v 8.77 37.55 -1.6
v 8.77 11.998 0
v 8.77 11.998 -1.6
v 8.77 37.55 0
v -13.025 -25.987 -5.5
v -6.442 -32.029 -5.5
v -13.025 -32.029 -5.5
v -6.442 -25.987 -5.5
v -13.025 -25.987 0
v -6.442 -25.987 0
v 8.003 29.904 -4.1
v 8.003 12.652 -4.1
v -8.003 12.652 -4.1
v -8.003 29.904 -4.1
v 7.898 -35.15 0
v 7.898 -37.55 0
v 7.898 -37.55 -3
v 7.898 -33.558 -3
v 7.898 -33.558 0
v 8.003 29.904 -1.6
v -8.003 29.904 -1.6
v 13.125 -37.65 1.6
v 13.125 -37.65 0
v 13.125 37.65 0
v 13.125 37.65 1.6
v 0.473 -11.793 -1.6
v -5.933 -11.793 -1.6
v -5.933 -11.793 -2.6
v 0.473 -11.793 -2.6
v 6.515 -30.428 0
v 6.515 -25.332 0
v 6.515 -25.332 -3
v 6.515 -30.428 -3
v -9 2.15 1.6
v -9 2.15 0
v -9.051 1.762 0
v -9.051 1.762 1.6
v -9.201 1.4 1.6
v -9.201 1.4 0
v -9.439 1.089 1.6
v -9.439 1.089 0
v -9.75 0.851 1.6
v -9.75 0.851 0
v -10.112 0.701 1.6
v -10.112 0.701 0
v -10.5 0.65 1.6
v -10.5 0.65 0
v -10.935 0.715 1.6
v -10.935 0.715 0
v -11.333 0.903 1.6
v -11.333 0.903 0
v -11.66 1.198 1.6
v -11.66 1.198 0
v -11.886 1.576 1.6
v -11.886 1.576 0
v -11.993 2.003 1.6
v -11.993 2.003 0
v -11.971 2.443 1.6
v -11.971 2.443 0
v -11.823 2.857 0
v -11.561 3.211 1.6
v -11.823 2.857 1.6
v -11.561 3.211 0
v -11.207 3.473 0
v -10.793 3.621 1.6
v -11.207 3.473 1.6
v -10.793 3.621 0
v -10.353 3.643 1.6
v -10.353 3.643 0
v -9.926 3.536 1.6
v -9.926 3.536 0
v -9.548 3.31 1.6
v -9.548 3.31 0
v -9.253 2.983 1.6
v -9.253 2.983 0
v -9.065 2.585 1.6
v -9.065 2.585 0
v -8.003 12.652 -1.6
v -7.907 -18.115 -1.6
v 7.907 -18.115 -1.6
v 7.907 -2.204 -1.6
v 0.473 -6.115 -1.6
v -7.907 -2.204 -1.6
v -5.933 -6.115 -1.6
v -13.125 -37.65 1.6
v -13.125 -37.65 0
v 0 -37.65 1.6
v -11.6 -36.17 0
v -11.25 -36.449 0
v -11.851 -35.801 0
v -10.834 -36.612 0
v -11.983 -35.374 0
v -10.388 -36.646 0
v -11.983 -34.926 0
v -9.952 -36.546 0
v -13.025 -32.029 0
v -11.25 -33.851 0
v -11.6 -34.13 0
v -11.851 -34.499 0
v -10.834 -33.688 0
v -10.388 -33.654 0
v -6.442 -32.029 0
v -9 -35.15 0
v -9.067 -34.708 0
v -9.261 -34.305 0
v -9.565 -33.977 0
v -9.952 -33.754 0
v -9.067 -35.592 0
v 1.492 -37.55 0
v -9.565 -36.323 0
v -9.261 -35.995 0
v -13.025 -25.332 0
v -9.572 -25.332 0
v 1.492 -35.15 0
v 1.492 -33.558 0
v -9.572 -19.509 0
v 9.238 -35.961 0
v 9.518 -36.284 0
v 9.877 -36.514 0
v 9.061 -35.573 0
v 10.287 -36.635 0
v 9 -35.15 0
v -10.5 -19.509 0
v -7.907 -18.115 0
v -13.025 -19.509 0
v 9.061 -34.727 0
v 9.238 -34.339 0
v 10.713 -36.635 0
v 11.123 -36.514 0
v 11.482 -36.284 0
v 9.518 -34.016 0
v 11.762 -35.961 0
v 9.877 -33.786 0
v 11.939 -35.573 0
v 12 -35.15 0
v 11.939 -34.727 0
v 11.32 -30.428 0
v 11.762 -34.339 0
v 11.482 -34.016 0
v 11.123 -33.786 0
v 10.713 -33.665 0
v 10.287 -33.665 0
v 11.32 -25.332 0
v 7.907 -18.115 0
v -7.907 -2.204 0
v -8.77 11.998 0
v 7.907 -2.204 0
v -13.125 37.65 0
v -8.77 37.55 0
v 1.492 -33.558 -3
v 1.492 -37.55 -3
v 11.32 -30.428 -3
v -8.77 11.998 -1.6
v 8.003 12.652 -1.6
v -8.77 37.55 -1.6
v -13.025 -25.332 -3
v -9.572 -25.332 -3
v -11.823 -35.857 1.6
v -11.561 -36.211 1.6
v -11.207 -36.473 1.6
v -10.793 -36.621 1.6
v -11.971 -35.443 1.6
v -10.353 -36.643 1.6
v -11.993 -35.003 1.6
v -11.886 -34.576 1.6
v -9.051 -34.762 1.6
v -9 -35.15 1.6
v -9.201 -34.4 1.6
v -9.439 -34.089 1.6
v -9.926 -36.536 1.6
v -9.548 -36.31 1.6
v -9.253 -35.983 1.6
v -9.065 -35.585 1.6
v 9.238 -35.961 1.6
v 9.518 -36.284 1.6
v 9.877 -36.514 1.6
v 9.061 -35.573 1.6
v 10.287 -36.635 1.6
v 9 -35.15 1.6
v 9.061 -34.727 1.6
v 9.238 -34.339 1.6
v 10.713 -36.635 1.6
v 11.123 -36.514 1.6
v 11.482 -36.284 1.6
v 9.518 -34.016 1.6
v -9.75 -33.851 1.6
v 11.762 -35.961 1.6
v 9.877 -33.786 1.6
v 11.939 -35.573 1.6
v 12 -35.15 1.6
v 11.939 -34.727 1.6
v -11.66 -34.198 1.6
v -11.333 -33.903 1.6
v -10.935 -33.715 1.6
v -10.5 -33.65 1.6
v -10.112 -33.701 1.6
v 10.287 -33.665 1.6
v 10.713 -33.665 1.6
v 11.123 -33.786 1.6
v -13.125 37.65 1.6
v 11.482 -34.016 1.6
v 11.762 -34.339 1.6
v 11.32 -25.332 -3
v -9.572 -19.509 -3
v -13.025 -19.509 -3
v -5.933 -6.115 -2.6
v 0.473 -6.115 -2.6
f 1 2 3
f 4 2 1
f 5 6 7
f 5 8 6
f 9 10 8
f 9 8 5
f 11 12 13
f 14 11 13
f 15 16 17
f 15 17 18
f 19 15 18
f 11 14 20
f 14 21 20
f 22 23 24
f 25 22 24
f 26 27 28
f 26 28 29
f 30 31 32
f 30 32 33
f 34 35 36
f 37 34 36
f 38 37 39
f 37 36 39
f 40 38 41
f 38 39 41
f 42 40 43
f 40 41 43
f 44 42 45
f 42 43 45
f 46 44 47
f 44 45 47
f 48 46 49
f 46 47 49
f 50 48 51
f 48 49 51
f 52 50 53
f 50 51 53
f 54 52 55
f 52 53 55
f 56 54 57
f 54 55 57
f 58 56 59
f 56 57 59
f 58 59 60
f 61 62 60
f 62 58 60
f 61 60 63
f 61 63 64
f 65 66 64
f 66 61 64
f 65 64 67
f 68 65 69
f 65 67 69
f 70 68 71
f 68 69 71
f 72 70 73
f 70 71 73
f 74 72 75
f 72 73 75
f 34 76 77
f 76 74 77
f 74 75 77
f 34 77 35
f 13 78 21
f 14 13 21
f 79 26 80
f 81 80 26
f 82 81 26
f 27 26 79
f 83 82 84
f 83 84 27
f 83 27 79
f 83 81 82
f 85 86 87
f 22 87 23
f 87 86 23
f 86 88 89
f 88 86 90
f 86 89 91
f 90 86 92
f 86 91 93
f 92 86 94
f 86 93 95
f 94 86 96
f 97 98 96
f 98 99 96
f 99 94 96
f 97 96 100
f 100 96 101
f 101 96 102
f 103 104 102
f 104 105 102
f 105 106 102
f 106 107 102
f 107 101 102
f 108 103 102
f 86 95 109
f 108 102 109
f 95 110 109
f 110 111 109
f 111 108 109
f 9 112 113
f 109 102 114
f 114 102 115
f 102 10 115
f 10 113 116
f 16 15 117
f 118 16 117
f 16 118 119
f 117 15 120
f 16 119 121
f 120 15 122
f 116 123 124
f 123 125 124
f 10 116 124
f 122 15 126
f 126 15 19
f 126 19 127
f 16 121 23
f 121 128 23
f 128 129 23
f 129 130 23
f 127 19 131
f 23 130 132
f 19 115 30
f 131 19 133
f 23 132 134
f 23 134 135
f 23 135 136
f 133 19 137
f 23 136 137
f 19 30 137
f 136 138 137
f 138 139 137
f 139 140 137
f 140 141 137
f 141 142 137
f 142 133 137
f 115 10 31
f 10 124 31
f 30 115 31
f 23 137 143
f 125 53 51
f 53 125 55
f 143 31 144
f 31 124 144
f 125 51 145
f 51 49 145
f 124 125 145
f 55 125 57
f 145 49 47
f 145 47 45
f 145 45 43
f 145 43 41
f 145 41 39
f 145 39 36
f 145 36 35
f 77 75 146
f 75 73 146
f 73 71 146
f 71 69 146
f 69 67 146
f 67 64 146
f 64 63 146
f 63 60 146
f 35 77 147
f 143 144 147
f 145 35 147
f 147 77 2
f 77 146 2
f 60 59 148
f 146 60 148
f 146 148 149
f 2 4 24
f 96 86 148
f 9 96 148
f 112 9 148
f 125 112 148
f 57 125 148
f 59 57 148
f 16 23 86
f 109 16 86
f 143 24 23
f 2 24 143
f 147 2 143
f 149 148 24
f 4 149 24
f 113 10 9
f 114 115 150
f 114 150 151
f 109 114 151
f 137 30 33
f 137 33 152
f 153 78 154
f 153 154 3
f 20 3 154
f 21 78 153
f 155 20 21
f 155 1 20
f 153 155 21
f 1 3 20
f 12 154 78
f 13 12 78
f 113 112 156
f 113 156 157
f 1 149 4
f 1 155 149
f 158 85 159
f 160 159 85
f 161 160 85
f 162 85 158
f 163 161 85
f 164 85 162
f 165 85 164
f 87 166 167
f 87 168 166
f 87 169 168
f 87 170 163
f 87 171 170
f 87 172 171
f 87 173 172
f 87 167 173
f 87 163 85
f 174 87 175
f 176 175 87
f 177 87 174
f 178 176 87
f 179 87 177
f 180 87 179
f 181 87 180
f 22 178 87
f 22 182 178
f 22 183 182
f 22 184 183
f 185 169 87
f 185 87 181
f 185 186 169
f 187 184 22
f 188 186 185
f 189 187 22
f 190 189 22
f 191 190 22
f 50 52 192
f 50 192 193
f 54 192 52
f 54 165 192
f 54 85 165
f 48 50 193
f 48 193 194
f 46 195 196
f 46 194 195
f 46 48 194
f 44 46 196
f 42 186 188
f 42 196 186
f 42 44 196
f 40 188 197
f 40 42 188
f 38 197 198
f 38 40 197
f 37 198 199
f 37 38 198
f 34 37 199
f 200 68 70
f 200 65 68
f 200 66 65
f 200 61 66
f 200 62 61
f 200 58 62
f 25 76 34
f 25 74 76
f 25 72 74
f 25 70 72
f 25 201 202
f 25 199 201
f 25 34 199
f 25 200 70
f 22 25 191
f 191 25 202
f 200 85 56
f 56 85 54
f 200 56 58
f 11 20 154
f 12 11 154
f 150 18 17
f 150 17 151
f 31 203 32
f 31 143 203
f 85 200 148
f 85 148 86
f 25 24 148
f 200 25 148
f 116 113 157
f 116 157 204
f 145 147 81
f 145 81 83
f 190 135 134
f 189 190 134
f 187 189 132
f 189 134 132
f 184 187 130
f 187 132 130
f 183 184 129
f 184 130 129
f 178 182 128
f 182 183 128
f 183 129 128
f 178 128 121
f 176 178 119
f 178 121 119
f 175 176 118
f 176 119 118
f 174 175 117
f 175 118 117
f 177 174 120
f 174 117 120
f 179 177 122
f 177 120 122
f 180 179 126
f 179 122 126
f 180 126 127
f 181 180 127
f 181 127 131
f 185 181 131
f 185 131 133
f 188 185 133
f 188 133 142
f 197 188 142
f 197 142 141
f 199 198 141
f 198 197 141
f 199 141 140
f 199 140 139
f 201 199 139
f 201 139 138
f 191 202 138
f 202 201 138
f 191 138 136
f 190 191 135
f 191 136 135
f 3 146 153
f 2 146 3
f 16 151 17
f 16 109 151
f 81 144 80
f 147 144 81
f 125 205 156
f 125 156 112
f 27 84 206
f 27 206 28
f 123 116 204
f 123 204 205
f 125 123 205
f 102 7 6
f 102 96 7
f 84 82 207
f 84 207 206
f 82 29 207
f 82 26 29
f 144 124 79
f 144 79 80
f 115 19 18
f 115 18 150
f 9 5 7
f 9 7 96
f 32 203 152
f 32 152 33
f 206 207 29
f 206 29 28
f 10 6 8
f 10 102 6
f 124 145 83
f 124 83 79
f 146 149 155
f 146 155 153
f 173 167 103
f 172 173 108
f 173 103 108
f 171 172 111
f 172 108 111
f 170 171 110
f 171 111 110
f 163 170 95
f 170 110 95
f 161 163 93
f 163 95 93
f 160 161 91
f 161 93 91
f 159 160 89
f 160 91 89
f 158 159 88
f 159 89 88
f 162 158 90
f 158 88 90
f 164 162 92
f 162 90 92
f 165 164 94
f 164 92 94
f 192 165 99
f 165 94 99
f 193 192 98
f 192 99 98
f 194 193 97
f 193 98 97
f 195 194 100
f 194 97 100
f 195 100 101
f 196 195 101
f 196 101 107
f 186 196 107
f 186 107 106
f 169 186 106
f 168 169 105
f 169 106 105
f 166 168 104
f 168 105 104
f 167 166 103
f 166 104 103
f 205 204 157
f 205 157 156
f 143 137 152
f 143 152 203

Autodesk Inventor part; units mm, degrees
ref_plane "YZ Plane" through (0, 0, 0) normal (1, 0, 0) x (0, 1, 0)
ref_plane "XZ Plane" through (0, 0, 0) normal (0, 1, 0) x (-1, 0, 0)
ref_plane "XY Plane" through (0, 0, 0) normal (0, 0, 1) x (1, 0, 0)
sketch "Boceto1" plane through (0, 0, 0) normal (0, 0, 1) x (1, 0, 0)
  line L0 (-13.125, -37.65) -> (13.125, -37.65)
  line L1 (13.125, -37.65) -> (13.125, 37.65)
  line L2 (13.125, 37.65) -> (-13.125, 37.65)
  line L3 (-13.125, 37.65) -> (-13.125, -37.65)
  line L4 (-13.125, -37.65) -> (13.125, 37.65) construction
  line L5 (13.125, -37.65) -> (-13.125, 37.65) construction
  line L6 (0, -37.65) -> (0, -35.15)
  line L7 (0, -35.15) -> (10.5, -35.15)
  line L8 (10.5, -35.15) -> (-10.5, -35.15)
  circle A0 centre (10.5, -35.15) radius 1.5
  circle A1 centre (-10.5, -35.15) radius 1.5
  line L9 (-10.5, -35.15) -> (-10.5, 2.15)
  circle A2 centre (-10.5, 2.15) radius 1.5
  point P0 (0, 0)
  dimension "d0" = 26.25
  dimension "d1" = 75.3
  dimension "d2" = 2.5
  dimension "d3" = 10.5
  dimension "d4" = 21
  dimension "d5" = 3
  dimension "d6" = 3
  dimension "d7" = 37.3
  dimension "d8" = 3
extrude "Extrusión1" add sketch "Boceto1" along normal blind 1.6
sketch "Boceto3" plane through (0, 0, 0) normal (0, 0, -1) x (-1, 0, 0)
  line L0 (-13.125, 37.65) -> (13.125, 37.65) projected
  line L1 (8.7698, 11.9975) -> (-8.7698, 11.9975)
  line L2 (-8.7698, 11.9975) -> (-8.7698, 37.65)
  line L3 (-8.7698, 37.65) -> (8.7698, 37.65)
  line L4 (8.7698, 37.65) -> (8.7698, 11.9975)
  line L5 (8.7698, 11.9975) -> (-8.7698, 37.65) construction
  line L6 (-8.7698, 11.9975) -> (8.7698, 37.65) construction
  line L7 (7.9072, -18.1146) -> (-7.9072, -18.1146)
  line L8 (-7.9072, -18.1146) -> (-7.9072, -2.2044)
  line L9 (-7.9072, -2.2044) -> (7.9072, -2.2044)
  line L10 (7.9072, -2.2044) -> (7.9072, -18.1146)
  line L11 (7.9072, -18.1146) -> (-7.9072, -2.2044) construction
  line L12 (-7.9072, -18.1146) -> (7.9072, -2.2044) construction
  point P0 (0, 0)
  point P1 (0, 24.8238)
  point P2 (0, -10.1595)
extrude "Extrusión2" add sketch "Boceto3" along normal blind 1.6
sketch "Boceto4" plane through (0, 0, -1.6) normal (0, 0, -1) x (-1, 0, 0)
  line L0 (8.003, 29.9035) -> (-8.003, 29.9035)
  line L1 (-8.003, 29.9035) -> (-8.003, 12.6515)
  line L2 (-8.003, 12.6515) -> (8.003, 12.6515)
  line L3 (8.003, 12.6515) -> (8.003, 29.9035)
  line L4 (8.003, 29.9035) -> (-8.003, 12.6515) construction
  line L5 (-8.003, 29.9035) -> (8.003, 12.6515) construction
  point P0 (0, 0)
  point P1 (0, 21.2775)
extrude "Extrusión3" add sketch "Boceto4" along normal blind 2.5
sketch "Boceto5" plane through (-13.125, 37.65, 1.6) normal (0, 1, 0) x (1, 0, 0)
  line L0 (21.8948, 3.2) -> (4.3552, 3.2) projected
  line L1 (21.8948, 1.6) -> (21.8948, 3.2) projected
  line L2 (4.3552, 3.2) -> (21.8948, 3.2)
  line L3 (21.8948, 3.2) -> (21.8948, 1.6)
  line L4 (21.8948, 1.6) -> (4.3552, 1.6)
  line L5 (4.3552, 1.6) -> (4.3552, 3.2)
  point P0 (13.125, 1.6)
extrude "Extrusión4" cut sketch "Boceto5" against normal blind 0.1
sketch "Boceto6" plane through (0, 0, -1.6) normal (0, 0, -1) x (-1, 0, 0)
  line L0 (5.9327, -11.7926) -> (-0.4732, -11.7926)
  line L1 (-0.4732, -11.7926) -> (-0.4732, -6.1147)
  line L2 (-0.4732, -6.1147) -> (5.9327, -6.1147)
  line L3 (5.9327, -6.1147) -> (5.9327, -11.7926)
  line L4 (5.9327, -11.7926) -> (-0.4732, -6.1147) construction
  line L5 (-0.4732, -11.7926) -> (5.9327, -6.1147) construction
  point P0 (0, 0)
  point P1 (2.7298, -8.9537)
extrude "Extrusión5" add sketch "Boceto6" along normal blind 1
sketch "Boceto7" plane through (0, 0, 0) normal (0, 0, -1) x (-1, 0, 0)
  line L0 (13.125, 37.65) -> (13.125, -37.65) projected
  line L1 (13.125, -32.0293) -> (6.4423, -32.0293)
  line L2 (6.4423, -32.0293) -> (6.4423, -25.9874)
  line L3 (6.4423, -25.9874) -> (13.125, -25.9874)
  line L4 (13.125, -25.9874) -> (13.125, -32.0293)
  point P0 (0, 0)
extrude "Extrusión6" add sketch "Boceto7" along normal blind 5.5
sketch "Boceto8" plane through (0, 0, 0) normal (0, 0, -1) x (-1, 0, 0)
  line L0 (13.125, 37.65) -> (13.125, -37.65) projected
  line L1 (13.125, -25.3323) -> (9.5724, -25.3323)
  line L2 (9.5724, -25.3323) -> (9.5724, -19.5088)
  line L3 (9.5724, -19.5088) -> (13.125, -19.5088)
  line L4 (13.125, -19.5088) -> (13.125, -25.3323)
  line L5 (13.125, -37.65) -> (-13.125, -37.65) projected
  line L6 (-1.4923, -37.65) -> (-7.8981, -37.65)
  line L7 (-7.8981, -37.65) -> (-7.8981, -33.558)
  line L8 (-7.8981, -33.558) -> (-1.4923, -33.558)
  line L9 (-1.4923, -33.558) -> (-1.4923, -37.65)
  line L10 (-6.5151, -30.4279) -> (-11.3195, -30.4279)
  line L11 (-11.3195, -30.4279) -> (-11.3195, -25.3323)
  line L12 (-11.3195, -25.3323) -> (-6.5151, -25.3323)
  line L13 (-6.5151, -25.3323) -> (-6.5151, -30.4279)
  point P0 (0, 0)
extrude "Extrusión7" add sketch "Boceto8" along normal blind 3
sketch "Boceto9" plane through (-13.125, -37.65, 1.6) normal (0, -1, 0) x (1, 0, 0)
  line L0 (14.6173, -4.6) -> (21.0231, -4.6) projected
  line L1 (21.0231, -1.6) -> (21.0231, -4.6) projected
  line L2 (14.6173, -4.6) -> (21.0231, -4.6)
  line L3 (21.0231, -4.6) -> (21.0231, -1.6)
  line L4 (21.0231, -1.6) -> (14.6173, -1.6)
  line L5 (14.6173, -1.6) -> (14.6173, -4.6)
  point P0 (13.125, -1.6)
extrude "Extrusión8" cut sketch "Boceto9" against normal blind 0.1
sketch "Boceto10" plane through (-13.125, -37.65, 1.6) normal (-1, 0, 0) x (0, 0, 1)
  line L0 (-4.6, 12.3177) -> (-4.6, 18.1412) projected
  line L1 (-1.6, 12.3177) -> (-1.6, 11.6626) projected
  line L2 (-4.6, 18.1412) -> (-1.6, 18.1412)
  line L3 (-1.6, 18.1412) -> (-1.6, 12.3177)
  line L4 (-1.6, 12.3177) -> (-4.6, 12.3177)
  line L5 (-4.6, 12.3177) -> (-4.6, 18.1412)
  line L6 (-7.1, 5.6207) -> (-7.1, 11.6626) projected
  line L7 (-1.6, 5.6207) -> (-7.1, 5.6207) projected
  line L8 (-7.1, 11.6626) -> (-1.6, 11.6626)
  line L9 (-1.6, 11.6626) -> (-1.6, 5.6207)
  line L10 (-1.6, 5.6207) -> (-7.1, 5.6207)
  line L11 (-7.1, 5.6207) -> (-7.1, 11.6626)
  point P0 (-1.6, 37.65)
extrude "Extrusión9" cut sketch "Boceto10" against normal blind 0.1
properties part number "ESP32"
